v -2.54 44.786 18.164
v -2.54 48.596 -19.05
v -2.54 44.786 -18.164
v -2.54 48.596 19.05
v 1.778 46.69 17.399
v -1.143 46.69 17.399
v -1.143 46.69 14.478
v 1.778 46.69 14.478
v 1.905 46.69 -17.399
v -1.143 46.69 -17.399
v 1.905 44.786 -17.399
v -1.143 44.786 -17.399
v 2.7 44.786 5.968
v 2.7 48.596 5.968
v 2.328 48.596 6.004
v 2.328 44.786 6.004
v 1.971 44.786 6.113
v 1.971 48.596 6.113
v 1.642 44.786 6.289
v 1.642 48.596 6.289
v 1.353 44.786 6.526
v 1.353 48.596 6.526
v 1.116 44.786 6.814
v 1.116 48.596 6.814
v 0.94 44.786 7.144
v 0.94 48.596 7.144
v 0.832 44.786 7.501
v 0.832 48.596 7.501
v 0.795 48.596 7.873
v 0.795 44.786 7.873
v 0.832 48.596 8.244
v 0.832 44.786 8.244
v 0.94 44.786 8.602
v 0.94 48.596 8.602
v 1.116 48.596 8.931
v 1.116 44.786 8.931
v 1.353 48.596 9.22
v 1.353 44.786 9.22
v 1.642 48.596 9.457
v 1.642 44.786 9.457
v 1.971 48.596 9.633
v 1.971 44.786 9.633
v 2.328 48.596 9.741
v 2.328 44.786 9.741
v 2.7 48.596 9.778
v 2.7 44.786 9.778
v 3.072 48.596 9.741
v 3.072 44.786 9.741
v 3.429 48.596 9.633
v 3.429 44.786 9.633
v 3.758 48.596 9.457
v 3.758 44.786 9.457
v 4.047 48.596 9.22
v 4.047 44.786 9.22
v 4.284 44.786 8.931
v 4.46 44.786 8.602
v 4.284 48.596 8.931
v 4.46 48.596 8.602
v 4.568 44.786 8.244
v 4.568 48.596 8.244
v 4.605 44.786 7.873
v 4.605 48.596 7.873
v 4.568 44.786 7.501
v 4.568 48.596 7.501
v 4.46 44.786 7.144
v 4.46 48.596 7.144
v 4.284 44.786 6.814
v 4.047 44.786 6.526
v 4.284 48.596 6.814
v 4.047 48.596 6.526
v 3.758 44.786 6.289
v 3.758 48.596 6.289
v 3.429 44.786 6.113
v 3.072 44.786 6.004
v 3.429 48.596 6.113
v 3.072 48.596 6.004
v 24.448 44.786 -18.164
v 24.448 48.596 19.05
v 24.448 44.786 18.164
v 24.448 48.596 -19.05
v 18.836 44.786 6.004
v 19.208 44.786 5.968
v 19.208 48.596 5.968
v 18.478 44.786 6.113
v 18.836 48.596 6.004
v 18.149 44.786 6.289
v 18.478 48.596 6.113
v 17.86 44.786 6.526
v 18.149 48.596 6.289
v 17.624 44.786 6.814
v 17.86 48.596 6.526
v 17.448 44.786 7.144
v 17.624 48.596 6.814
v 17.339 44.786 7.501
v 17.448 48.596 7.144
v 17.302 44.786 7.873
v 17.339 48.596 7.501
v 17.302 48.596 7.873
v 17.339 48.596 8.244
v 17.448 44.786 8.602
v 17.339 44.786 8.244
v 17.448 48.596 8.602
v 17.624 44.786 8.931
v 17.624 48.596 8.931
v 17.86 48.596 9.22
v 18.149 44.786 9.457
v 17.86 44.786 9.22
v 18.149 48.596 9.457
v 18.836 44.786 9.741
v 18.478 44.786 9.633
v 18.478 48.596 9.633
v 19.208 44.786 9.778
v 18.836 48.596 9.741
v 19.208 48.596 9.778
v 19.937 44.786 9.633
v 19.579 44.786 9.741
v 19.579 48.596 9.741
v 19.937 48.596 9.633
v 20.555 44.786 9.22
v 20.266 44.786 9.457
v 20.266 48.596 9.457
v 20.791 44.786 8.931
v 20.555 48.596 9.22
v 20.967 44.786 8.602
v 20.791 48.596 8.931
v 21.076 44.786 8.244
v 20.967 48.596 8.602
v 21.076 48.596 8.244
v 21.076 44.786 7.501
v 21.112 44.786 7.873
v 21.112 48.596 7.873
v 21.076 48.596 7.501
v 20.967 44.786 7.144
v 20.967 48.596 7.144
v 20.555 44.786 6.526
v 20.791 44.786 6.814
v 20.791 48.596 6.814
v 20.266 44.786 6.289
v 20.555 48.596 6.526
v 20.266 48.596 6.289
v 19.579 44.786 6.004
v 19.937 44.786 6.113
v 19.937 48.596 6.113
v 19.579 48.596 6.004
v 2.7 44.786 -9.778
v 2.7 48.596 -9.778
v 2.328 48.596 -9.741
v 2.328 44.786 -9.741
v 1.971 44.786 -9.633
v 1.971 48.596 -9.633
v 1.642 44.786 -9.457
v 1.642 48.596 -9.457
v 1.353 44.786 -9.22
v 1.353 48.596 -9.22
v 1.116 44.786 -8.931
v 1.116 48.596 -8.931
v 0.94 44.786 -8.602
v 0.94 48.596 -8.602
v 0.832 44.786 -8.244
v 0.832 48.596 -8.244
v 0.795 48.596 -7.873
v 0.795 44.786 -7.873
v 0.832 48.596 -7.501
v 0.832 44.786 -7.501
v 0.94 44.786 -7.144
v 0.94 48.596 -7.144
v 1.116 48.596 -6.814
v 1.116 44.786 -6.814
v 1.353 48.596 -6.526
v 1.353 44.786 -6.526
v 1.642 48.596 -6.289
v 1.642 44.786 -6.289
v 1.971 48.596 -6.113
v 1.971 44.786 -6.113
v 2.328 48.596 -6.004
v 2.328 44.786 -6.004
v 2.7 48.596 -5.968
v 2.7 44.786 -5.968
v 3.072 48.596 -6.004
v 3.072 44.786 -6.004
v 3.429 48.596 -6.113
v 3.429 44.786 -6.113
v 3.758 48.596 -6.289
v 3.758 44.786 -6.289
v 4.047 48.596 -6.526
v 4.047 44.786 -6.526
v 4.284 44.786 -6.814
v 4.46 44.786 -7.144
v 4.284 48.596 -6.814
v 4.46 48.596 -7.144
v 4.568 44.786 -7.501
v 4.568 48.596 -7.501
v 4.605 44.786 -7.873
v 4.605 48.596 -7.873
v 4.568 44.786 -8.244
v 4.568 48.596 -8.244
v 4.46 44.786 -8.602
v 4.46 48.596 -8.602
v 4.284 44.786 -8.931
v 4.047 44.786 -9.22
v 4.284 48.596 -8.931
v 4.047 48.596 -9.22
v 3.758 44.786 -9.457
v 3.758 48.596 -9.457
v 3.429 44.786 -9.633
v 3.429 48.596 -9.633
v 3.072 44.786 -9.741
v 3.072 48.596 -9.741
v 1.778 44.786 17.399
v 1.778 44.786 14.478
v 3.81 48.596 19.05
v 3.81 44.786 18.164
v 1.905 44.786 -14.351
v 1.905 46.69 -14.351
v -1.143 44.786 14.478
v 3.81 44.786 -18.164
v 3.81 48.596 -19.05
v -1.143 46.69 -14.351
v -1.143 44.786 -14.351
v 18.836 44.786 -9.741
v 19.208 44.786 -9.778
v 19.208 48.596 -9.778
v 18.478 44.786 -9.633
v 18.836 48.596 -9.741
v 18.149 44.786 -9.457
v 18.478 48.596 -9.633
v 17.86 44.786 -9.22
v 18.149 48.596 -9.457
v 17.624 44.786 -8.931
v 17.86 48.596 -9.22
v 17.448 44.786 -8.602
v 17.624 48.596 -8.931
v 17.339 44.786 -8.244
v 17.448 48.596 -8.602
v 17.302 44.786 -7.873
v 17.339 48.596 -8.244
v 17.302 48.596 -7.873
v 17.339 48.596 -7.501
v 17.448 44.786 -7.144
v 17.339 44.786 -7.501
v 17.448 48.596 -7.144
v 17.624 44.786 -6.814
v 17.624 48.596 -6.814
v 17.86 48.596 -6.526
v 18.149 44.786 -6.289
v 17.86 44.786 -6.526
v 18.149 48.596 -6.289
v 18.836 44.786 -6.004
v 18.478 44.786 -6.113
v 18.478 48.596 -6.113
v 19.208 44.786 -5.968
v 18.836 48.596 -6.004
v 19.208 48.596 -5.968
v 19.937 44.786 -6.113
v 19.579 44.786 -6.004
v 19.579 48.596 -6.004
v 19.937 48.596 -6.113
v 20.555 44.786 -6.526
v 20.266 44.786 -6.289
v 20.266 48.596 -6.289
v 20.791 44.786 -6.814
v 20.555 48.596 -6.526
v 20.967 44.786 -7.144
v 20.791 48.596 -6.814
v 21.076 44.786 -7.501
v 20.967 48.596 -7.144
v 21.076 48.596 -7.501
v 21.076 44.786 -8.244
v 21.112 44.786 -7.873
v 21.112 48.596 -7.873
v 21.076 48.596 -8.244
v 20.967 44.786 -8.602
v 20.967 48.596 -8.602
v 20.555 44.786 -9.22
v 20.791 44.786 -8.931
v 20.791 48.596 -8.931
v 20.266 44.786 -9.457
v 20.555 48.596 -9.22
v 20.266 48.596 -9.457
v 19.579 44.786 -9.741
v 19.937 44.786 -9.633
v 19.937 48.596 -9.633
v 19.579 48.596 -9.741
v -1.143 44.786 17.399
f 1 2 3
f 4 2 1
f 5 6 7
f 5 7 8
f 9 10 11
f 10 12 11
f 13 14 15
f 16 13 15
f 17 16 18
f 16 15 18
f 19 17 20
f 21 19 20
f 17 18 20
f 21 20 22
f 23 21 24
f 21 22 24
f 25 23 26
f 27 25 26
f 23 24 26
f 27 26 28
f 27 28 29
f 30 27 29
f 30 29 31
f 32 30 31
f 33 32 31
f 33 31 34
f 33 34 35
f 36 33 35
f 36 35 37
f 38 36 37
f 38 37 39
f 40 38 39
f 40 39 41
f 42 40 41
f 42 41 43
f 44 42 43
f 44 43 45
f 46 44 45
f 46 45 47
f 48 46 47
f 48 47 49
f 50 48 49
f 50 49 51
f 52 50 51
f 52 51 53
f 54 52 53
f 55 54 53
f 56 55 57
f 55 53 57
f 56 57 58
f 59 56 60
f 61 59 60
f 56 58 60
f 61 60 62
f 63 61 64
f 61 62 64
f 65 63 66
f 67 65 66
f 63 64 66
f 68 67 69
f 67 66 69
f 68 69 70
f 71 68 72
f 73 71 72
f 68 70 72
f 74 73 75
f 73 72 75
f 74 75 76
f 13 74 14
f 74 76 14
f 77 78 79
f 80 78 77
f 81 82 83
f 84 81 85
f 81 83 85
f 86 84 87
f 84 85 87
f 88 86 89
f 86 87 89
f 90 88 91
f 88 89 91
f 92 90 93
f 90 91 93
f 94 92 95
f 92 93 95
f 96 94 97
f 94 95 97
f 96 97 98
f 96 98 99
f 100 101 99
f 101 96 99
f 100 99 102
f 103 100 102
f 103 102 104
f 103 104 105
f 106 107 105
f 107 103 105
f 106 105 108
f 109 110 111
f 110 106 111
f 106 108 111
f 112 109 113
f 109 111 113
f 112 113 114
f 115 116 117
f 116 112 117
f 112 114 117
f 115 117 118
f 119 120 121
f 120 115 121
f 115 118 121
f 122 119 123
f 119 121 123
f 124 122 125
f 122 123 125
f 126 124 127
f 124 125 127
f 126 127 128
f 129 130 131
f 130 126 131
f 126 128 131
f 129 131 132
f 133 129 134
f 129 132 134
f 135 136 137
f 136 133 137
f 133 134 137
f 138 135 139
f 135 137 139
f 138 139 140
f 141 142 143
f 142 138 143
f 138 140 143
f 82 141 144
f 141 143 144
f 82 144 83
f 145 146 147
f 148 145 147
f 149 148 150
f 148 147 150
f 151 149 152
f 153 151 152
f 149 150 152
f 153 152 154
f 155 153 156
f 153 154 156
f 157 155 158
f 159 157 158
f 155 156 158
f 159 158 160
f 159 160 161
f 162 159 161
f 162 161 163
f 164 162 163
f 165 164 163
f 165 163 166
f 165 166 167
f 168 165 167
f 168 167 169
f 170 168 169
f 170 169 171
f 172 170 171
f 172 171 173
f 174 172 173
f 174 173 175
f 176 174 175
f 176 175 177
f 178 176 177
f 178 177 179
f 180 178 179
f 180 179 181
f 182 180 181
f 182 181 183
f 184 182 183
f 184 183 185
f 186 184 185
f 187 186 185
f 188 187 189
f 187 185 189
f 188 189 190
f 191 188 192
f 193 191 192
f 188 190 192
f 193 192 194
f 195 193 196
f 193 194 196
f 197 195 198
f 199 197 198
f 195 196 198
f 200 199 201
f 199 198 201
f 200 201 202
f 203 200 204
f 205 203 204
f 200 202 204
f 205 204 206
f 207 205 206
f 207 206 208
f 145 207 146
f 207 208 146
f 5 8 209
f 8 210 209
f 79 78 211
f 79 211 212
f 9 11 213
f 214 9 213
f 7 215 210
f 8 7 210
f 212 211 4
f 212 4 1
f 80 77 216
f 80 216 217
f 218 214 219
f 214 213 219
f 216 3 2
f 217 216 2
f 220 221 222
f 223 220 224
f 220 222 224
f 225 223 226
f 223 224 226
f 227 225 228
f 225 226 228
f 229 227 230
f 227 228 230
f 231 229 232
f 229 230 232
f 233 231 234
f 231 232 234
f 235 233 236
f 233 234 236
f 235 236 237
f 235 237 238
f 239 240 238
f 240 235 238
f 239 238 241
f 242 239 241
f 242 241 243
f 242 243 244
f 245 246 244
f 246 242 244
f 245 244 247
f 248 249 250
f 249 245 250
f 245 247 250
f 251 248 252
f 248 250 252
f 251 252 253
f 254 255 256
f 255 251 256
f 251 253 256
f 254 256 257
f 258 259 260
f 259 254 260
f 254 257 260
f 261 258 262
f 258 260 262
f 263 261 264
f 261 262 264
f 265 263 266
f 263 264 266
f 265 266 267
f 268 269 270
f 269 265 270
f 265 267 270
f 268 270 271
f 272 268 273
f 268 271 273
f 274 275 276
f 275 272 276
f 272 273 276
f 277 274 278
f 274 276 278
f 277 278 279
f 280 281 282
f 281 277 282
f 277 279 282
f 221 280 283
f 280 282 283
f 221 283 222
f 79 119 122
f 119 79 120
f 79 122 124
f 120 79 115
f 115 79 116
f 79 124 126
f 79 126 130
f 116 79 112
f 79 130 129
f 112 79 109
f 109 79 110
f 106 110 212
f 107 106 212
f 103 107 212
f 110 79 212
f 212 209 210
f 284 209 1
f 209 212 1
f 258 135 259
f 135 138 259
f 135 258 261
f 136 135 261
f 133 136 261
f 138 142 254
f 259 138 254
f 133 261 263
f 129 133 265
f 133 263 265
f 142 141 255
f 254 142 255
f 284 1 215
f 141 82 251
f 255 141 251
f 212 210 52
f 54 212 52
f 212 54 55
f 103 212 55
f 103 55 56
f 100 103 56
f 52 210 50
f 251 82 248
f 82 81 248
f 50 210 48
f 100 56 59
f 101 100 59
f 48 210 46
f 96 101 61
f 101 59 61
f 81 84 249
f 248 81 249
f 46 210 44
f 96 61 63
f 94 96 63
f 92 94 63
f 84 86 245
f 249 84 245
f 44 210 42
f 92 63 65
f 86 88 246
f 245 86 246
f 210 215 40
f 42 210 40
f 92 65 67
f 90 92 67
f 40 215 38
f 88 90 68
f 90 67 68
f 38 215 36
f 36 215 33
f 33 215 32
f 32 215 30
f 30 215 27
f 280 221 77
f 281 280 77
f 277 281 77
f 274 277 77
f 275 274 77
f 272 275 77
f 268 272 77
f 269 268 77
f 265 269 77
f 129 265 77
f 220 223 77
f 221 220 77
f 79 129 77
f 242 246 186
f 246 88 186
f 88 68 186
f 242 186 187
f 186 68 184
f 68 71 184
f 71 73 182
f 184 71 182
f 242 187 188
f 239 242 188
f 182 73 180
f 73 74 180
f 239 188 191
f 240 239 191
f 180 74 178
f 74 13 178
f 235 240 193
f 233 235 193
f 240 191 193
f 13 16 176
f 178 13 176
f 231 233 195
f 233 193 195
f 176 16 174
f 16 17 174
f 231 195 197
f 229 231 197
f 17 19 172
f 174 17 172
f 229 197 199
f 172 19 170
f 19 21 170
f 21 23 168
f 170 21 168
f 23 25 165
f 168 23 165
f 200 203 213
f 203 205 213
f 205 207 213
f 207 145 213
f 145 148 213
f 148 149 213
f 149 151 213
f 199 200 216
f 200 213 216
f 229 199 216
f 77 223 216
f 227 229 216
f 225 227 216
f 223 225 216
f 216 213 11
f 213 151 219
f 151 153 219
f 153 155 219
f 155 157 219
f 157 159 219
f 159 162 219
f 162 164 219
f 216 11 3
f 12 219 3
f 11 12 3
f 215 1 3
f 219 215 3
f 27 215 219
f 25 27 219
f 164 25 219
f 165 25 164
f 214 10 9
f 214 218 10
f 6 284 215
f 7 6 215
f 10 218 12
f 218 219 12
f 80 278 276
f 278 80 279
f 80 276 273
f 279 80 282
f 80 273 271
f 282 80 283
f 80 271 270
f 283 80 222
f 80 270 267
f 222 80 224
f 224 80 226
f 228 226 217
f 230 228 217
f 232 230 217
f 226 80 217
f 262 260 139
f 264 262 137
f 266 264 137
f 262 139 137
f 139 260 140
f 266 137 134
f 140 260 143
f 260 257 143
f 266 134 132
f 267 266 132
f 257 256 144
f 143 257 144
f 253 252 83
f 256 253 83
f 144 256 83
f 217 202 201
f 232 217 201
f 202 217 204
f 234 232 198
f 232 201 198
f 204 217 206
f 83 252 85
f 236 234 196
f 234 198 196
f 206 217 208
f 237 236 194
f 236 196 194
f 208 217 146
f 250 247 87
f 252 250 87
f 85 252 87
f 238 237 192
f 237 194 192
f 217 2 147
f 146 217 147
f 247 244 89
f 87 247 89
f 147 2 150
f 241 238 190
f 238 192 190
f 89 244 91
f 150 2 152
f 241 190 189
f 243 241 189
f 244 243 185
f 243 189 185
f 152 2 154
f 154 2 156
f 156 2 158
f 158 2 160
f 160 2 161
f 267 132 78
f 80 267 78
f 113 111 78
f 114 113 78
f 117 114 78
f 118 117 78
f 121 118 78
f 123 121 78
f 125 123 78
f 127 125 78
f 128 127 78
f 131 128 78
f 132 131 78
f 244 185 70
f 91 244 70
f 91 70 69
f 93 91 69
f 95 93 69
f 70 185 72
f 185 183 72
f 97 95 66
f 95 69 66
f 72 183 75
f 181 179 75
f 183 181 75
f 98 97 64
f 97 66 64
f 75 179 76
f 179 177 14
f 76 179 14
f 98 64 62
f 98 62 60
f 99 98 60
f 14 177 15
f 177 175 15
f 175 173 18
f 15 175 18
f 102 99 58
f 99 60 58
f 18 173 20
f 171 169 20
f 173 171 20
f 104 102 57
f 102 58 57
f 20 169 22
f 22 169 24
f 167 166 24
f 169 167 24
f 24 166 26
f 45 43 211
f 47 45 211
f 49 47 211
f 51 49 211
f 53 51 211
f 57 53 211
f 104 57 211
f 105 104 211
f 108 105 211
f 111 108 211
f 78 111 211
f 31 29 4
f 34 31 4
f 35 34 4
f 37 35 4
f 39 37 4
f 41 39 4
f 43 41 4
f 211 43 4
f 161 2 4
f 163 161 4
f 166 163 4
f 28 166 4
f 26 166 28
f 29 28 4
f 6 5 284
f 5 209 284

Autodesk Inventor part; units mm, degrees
sketch "Sketch1" plane through (0, 0, 0) normal (1, 0, 0) x (0, 1, 0)
  circle A0 centre (0, 0) radius 3.937
  circle A1 centre (0, 0) radius 7.747
  dimension "d0" = 7.874
  dimension "d1" = 3.81
ref_plane "Work Plane2" through (0, 0, 0) normal (-1, 0, 0) x (0, 0, 1)
sketch "Sketch2" plane through (0, 0, 0) normal (-1, 0, 0) x (0, 0, 1)
  circle A0 centre (0, 0) radius 7.7384
  circle A1 centre (0, 0) radius 7.747
ref_plane "Work Plane4" through (-2.54, 0, 0) normal (-1, 0, 0) x (0, 0, 1)
sketch "Sketch3" plane through (-2.54, 0, 0) normal (-1, 0, 0) x (0, 0, 1)
  line L0 (19.05, 48.5955) -> (-19.05, 48.5955)
  circle A0 centre (0, 0) radius 7.747 projected
  line L1 (7.747, 0) -> (19.05, 48.5955)
  line L2 (-7.747, 0) -> (-19.05, 48.5955)
  arc A1 (7.747, 0) -> (-7.747, 0) centre (0, 0) ccw
  line L3 (-14.2521, 44.7855) -> (14.2521, 44.7855)
  line L4 (14.2521, 44.7855) -> (6.1161, 9.806)
  arc A2 (6.1161, 9.806) -> (-6.1161, 9.806) centre (0, 0) ccw
  line L5 (-6.1161, 9.806) -> (-14.2521, 44.7855)
  dimension "d6" = 38.1
  dimension "d7" = 19.05
  dimension "d8" = 3.81
ref_plane "Work Plane5" through (3.81, 0, 0) normal (1, 0, 0) x (0, 0, -1)
sketch "Sketch4" plane through (3.81, 0, 0) normal (1, 0, 0) x (0, 0, -1)
  line L0 (14.2521, 44.7855) -> (6.1161, 9.806) projected
  line L1 (14.2521, 44.7855) -> (6.1161, 9.806) projected
  arc A0 (6.1161, 9.806) -> (-6.1161, 9.806) centre (0, 0) ccw projected
  line L2 (-6.1161, 9.806) -> (-14.2521, 44.7855) projected
  line L3 (-14.2521, 44.7855) -> (14.2521, 44.7855) projected
  line L4 (19.05, 48.5955) -> (-19.05, 48.5955) projected
  line L5 (-19.05, 48.5955) -> (-7.747, 0) projected
  line L6 (7.747, 0) -> (19.05, 48.5955) projected
  line L7 (-14.2521, 44.7855) -> (14.2521, 44.7855) projected
  line L8 (14.2521, 44.7855) -> (18.1638, 44.7855)
  line L9 (14.2521, 44.7855) -> (-14.2521, 44.7855)
  line L10 (-14.2521, 44.7855) -> (-18.1638, 44.7855)
  line L11 (-19.05, 48.5955) -> (-7.747, 0) projected
  line L12 (-19.05, 48.5955) -> (-18.1638, 44.7855)
  line L13 (18.1638, 44.7855) -> (19.05, 48.5955)
  line L14 (-19.05, 48.5955) -> (19.05, 48.5955) projected
  line L15 (19.05, 48.5955) -> (-19.05, 48.5955)
  line L16 (18.1638, 44.7855) -> (-18.1638, 44.7855)
  arc A1 (7.747, 0) -> (-7.747, 0) centre (0, 0) ccw projected
extrude "Extrusion4" add sketch "Sketch4" along normal blind 20.6375 contours L3 L10 L5 L4 L6 L8
ref_plane "Work Plane7" through (-2.54, 44.7855, -14.2521) normal (0, -1, 0) x (1, 0, 0)
ref_plane "Work Plane6" through (-2.54, 44.7855, -14.2521) normal (0, -1, 0) x (1, 0, 0)
sketch "Sketch6" plane through (-2.54, 44.7855, -14.2521) normal (0, -1, 0) x (1, 0, 0)
  line L0 (6.35, 32.4159) -> (26.9875, 32.4159) projected
  line L1 (13.4874, 32.4159) -> (13.4874, 26.0989)
  line L2 (26.9875, 32.4159) -> (26.9875, -3.9117) projected
  point P0 (2.54, 14.2521)
  dimension "d20" = 13.5001
ref_plane "Work Plane1" through (10.9347, 0, 0) normal (1, 0, 0) x (0, 0, -1)
ref_plane "Work Plane3" through (0, 0, 0) normal (1, 0, 0) x (0, 0, -1)
sketch "Sketch10" plane through (0, 0, 0) normal (1, 0, 0) x (0, 0, -1)
  circle A0 centre (0, 0) radius 1.4542
extrude "Extrusion7" cut sketch "Sketch10" against normal blind 22.225
sketch "Sketch12" plane through (3.81, 0, 0) normal (-1, 0, 0) x (0, 0, 1)
  line L0 (18.1638, 44.7855) -> (-18.1638, 44.7855) projected
  line L1 (19.05, 48.5955) -> (18.1638, 44.7855) projected
  line L2 (-19.05, 48.5955) -> (19.05, 48.5955) projected
  line L3 (-19.05, 48.5955) -> (19.05, 48.5955) projected
  line L4 (18.1638, 44.7855) -> (-18.1638, 44.7855) projected
  line L5 (-19.05, 48.5955) -> (19.05, 48.5955) projected
  line L6 (-18.1638, 44.7855) -> (-19.05, 48.5955) projected
  line L7 (18.1638, 44.7855) -> (-18.1638, 44.7855) projected
  line L8 (-19.05, 48.5955) -> (19.05, 48.5955) projected
  line L9 (19.05, 48.5955) -> (-19.05, 48.5955)
  line L10 (-9.4207, 44.7855) -> (-18.1638, 44.7855) projected
  line L11 (-19.05, 48.5955) -> (-18.1638, 44.7855)
  line L12 (18.1638, 44.7855) -> (-18.1638, 44.7855) projected
  line L13 (-18.1638, 44.7855) -> (18.1638, 44.7855)
  line L14 (18.1638, 44.7855) -> (19.05, 48.5955)
  line L15 (19.05, 48.5955) -> (18.1638, 44.7855) projected
  line L16 (19.05, 48.5955) -> (18.1638, 44.7855) projected
  line L17 (-18.1638, 44.7855) -> (-19.05, 48.5955) projected
  line L18 (-18.1638, 44.7855) -> (-19.05, 48.5955) projected
  point P0 (0, 0)
  point P1 (9.4207, 48.5955)
  point P2 (9.4207, 44.7855)
  point P3 (6.3245, 44.7855)
  point P4 (6.3245, 48.5955)
  point P5 (-6.3245, 48.5955)
  point P6 (-6.3245, 44.7855)
  point P7 (-9.4207, 48.5955)
extrude "Extrusion8" add sketch "Sketch12" along normal blind 6.35
sketch "Sketch13" plane through (24.4475, 44.7855, -18.1638) normal (0, -1, 0) x (1, 0, 0)
  line L0 (-26.9875, 0) -> (-26.9875, 36.3276) projected
  line L1 (0, 36.3276) -> (0, 0) projected
  line L2 (-26.9875, 36.3276) -> (0, 36.3276) projected
  line L3 (-26.9875, -0.8862) -> (0, -0.8862) projected
  line L4 (0, 37.2138) -> (-26.9875, 37.2138) projected
  point P0 (-24.4475, 18.1638)
  point P1 (-21.7476, 26.0364)
  point P2 (-21.7476, 10.2912)
  dimension "d35" = 21.7476
  dimension "d36" = 21.7476
  dimension "d38" = 11.1774
  dimension "d39" = 11.1774
ref_plane "Work Plane8" through (10.9537, 0, 0) normal (1, 0, 0) x (0, 0, -1)
hole "Hole2" at (2.6999, 44.7855, -7.8726) at (2.6999, 44.7855, 7.8726) direction (0, 1, 0) diameter 3.81 end through all
mirror "Mirror2" about plane through (10.9537, 0, 0) normal (1, 0, 0) of "Hole2"
sketch "Sketch14" plane through (24.4475, 44.7855, -18.1638) normal (0, -1, 0) x (1, 0, 0)
  line L0 (-25.5905, 0.7648) -> (-22.5425, 0.7648)
  line L1 (-22.5425, 0.7648) -> (-22.5425, 3.8128)
  line L2 (-22.5425, 3.8128) -> (-25.5905, 3.8128)
  line L3 (-25.5905, 3.8128) -> (-25.5905, 0.7648)
  line L4 (-26.9875, -0.8862) -> (0, -0.8862) projected
  line L5 (-26.9875, 0) -> (-26.9875, 36.3276) projected
  line L6 (-25.5905, 32.6418) -> (-22.6695, 32.6418)
  line L7 (-22.6695, 32.6418) -> (-22.6695, 35.5628)
  line L8 (-22.6695, 35.5628) -> (-25.5905, 35.5628)
  line L9 (-25.5905, 35.5628) -> (-25.5905, 32.6418)
  line L10 (0, 37.2138) -> (-26.9875, 37.2138) projected
  point P0 (-24.4475, 18.1638)
  dimension "d47" = 3.048
  dimension "d48" = 3.048
  dimension "d49" = 1.651
  dimension "d50" = 1.397
  dimension "d51" = 2.921
  dimension "d52" = 2.921
  dimension "d53" = 1.651
  dimension "d54" = 1.397
extrude "Extrusion9" cut sketch "Sketch14" against normal blind 1.905
properties part number "BottomHolderThrustMotorHousing"
